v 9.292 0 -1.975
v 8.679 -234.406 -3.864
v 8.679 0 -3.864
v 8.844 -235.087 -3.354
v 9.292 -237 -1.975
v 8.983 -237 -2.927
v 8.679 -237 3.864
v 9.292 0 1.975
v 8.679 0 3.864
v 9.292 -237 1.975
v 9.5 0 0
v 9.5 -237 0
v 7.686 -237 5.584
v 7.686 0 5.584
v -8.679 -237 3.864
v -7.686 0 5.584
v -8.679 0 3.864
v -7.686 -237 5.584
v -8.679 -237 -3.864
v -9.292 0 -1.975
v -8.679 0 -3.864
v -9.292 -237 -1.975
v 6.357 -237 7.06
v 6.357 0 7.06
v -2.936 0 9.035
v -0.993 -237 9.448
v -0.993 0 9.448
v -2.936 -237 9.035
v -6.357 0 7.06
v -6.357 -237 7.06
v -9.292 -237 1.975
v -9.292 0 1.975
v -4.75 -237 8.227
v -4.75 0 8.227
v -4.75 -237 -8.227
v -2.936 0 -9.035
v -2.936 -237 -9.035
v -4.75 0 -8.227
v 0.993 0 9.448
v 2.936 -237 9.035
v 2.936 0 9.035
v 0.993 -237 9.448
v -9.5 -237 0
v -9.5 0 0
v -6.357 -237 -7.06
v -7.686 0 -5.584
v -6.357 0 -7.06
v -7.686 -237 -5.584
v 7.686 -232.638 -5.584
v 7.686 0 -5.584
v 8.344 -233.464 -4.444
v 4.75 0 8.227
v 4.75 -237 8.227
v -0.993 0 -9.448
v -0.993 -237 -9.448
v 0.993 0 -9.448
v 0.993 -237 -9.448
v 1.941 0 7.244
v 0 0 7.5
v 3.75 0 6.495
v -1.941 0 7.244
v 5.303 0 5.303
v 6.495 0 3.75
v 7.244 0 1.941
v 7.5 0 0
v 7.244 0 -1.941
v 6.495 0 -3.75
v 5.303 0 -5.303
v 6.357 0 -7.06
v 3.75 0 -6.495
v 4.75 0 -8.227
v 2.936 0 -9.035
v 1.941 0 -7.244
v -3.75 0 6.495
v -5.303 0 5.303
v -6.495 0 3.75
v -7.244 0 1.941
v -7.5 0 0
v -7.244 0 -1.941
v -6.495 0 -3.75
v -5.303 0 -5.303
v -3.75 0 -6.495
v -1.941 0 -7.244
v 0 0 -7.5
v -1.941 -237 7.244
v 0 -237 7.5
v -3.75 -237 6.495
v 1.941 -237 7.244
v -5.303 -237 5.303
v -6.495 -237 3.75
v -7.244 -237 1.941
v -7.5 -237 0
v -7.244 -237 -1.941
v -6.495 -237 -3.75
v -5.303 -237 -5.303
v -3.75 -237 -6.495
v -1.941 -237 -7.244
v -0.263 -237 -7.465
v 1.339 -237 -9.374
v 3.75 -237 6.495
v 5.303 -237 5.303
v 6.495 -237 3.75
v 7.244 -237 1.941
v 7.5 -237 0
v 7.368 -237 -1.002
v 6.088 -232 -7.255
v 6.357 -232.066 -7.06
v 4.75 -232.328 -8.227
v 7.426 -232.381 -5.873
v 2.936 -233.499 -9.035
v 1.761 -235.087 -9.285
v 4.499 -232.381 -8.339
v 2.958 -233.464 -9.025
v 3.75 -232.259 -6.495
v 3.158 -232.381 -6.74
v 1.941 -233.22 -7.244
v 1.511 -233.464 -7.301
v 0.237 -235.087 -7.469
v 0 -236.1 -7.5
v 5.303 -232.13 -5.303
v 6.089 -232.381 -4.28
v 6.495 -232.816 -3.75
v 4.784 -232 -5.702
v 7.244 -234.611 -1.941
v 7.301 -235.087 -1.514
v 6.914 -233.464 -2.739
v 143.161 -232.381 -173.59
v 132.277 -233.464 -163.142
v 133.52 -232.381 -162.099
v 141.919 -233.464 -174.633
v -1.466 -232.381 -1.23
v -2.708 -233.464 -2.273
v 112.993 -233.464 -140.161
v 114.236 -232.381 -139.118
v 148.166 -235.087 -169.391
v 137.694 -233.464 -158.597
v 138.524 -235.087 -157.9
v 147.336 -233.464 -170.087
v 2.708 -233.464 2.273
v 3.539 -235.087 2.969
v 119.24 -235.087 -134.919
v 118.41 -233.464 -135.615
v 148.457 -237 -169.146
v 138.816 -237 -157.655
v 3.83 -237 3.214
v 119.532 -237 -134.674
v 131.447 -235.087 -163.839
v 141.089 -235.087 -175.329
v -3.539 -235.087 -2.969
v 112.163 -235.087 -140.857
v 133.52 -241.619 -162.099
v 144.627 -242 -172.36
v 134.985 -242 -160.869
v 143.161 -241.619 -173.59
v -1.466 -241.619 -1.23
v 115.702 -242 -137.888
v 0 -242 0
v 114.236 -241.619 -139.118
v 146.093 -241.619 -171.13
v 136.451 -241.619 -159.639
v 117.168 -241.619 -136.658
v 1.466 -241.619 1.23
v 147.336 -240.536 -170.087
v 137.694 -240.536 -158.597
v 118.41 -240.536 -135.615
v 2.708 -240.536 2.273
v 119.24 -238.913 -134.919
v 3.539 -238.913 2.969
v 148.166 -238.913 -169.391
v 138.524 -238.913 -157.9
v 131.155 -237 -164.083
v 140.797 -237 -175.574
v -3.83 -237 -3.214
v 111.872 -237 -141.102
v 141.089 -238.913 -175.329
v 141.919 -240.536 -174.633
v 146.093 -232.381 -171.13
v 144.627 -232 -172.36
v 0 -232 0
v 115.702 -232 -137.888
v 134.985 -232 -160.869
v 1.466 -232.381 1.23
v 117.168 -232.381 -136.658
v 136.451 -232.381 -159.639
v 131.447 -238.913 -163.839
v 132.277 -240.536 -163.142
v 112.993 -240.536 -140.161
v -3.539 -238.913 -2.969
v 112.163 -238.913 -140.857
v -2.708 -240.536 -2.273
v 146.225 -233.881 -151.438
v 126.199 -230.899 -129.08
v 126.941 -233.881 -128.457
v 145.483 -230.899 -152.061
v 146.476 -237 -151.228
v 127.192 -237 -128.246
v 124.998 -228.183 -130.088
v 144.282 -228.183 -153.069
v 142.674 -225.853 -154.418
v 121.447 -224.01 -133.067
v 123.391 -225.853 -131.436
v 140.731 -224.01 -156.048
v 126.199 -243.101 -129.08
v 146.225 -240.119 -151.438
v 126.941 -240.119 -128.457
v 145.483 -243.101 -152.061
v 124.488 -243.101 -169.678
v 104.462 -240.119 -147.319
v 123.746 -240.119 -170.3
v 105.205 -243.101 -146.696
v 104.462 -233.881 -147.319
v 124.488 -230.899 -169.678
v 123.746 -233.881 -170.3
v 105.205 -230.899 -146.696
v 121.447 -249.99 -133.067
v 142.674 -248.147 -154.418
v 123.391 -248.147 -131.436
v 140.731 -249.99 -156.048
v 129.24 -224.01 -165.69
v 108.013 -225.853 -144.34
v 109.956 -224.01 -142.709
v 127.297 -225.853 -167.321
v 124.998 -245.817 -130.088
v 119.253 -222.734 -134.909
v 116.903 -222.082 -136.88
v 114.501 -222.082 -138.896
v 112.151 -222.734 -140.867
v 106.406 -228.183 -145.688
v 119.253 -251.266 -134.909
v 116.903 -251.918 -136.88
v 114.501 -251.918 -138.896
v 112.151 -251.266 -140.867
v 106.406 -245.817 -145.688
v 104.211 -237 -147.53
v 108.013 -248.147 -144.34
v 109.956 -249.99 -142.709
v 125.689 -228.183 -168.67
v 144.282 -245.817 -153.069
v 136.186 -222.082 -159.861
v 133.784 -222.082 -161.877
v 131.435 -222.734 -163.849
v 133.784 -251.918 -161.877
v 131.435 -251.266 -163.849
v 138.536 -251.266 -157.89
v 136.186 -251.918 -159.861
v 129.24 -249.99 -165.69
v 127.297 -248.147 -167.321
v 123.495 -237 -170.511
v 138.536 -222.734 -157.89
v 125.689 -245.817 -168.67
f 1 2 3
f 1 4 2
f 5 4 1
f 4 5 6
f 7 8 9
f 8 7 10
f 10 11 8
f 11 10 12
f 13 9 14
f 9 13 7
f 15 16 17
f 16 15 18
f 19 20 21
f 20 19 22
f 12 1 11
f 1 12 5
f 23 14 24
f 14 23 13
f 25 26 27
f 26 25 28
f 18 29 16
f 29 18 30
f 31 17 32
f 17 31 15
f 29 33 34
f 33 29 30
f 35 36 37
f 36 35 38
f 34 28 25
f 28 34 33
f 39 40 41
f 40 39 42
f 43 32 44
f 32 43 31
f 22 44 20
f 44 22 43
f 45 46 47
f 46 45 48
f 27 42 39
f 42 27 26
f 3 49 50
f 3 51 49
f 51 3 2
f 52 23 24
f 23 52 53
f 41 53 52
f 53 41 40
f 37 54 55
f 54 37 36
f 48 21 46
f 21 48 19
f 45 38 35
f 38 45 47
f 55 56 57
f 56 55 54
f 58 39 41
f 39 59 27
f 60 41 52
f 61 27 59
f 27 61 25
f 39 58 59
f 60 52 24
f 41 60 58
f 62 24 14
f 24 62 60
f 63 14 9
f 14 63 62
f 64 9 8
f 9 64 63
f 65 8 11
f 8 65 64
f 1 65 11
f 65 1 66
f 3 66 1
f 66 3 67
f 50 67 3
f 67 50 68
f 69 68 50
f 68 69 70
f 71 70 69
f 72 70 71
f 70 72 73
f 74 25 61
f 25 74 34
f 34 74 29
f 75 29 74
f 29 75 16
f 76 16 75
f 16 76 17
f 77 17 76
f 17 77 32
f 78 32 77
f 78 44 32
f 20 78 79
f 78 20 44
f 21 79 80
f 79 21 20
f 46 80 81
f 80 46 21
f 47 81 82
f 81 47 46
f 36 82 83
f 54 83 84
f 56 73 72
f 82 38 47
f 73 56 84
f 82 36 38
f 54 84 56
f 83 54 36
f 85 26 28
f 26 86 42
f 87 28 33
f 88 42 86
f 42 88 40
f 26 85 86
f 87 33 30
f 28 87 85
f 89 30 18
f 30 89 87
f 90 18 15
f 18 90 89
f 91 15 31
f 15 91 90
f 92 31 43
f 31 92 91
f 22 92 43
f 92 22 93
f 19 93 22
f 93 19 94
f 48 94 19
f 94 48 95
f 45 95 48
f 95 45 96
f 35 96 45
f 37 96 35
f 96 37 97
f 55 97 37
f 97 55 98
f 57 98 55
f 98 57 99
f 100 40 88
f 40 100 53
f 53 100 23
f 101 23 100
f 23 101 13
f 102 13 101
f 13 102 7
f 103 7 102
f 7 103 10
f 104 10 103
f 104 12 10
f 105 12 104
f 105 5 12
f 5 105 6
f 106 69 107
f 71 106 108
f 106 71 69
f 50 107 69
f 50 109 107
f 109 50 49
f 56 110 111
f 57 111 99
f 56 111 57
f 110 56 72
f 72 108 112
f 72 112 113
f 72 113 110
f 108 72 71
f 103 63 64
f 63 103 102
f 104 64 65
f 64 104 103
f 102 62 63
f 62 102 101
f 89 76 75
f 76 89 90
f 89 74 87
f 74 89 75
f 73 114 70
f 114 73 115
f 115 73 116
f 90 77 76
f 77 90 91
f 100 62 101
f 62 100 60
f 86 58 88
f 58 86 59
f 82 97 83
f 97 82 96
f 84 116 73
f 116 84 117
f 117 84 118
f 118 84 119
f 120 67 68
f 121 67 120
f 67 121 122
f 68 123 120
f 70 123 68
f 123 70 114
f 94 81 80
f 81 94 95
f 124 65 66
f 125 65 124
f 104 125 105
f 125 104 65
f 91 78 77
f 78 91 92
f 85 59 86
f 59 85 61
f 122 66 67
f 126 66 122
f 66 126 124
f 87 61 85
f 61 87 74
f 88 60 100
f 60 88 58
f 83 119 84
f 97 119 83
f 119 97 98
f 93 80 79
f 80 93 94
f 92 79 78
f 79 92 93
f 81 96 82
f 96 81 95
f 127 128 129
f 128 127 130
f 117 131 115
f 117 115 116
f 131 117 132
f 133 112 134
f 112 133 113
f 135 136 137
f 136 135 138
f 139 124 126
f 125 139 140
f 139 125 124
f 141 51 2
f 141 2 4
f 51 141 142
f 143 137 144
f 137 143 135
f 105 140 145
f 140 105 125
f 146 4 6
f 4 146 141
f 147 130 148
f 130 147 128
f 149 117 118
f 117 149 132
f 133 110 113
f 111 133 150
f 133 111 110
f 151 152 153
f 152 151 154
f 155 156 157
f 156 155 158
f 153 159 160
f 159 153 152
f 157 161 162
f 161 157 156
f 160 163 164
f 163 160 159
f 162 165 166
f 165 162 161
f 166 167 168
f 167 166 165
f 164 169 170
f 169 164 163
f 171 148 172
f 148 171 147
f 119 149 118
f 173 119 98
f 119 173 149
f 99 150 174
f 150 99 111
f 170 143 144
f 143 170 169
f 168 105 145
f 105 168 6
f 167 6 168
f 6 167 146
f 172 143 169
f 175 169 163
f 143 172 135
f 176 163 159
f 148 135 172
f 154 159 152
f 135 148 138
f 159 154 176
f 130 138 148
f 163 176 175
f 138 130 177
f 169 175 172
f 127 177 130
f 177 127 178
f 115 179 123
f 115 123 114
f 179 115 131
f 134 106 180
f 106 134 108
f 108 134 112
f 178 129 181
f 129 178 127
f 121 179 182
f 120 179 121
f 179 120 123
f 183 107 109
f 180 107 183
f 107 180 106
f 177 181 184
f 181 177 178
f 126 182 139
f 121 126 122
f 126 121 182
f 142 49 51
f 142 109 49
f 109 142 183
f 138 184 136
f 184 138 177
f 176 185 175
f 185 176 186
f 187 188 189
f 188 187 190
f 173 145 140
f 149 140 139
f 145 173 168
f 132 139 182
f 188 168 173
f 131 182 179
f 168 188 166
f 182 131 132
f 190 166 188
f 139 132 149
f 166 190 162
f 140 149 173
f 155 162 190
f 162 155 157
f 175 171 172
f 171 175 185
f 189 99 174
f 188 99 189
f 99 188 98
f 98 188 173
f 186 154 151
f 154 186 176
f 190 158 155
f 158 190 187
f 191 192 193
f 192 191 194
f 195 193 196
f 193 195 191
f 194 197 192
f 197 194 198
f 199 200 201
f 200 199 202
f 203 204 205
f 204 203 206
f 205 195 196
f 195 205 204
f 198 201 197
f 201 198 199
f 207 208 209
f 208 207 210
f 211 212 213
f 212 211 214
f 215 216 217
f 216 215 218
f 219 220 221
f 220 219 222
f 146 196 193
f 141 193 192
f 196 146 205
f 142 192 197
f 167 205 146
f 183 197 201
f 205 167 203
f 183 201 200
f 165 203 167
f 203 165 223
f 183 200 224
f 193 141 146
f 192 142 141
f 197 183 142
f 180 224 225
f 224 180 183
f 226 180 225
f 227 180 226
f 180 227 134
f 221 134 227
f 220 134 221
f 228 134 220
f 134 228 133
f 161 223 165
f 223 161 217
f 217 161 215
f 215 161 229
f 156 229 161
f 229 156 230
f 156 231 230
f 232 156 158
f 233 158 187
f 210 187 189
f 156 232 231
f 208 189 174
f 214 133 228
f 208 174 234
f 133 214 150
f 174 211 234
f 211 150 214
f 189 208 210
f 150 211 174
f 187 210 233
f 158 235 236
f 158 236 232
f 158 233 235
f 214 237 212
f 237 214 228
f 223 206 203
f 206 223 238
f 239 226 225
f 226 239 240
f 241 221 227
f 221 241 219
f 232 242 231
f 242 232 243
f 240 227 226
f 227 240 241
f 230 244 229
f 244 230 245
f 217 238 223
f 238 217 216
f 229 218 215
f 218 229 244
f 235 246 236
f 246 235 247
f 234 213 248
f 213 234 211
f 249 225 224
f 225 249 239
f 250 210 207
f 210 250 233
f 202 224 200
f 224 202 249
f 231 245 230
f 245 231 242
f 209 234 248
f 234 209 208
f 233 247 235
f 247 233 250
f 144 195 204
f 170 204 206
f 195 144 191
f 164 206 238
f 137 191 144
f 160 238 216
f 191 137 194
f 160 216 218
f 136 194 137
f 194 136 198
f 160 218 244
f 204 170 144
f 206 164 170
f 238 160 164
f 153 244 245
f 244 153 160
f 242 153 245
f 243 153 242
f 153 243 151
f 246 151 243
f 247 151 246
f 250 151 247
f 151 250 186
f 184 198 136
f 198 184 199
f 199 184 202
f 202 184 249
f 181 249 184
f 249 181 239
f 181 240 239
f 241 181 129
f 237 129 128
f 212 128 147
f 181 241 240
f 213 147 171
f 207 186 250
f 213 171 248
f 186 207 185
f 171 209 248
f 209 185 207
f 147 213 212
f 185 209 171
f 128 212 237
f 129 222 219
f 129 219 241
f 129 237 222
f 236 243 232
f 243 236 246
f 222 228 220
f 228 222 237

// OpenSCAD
// ==================== PARÁMETROS ====================
L_pendulo = 225;          
L_peso = 30;              
r_peso = 15;
r_varilla = 5;

armlength = 237;
pared = 2;
diam_tubo_arm = 19;
radio_ext = diam_tubo_arm / 2;
radio_int = radio_ext - pared;

// ==================== MÓDULOS ====================


// Brazo: se extiende a lo largo del eje Y positivo
module arm(){
    rotate([90, 0, 0]) {
        difference(){
            cylinder(h=armlength, r=radio_ext, center=false);
            cylinder(h=armlength + 2, r=radio_int, center=false);
        }
    }
}



// Péndulo: su PIVOTE está en el origen (parte superior de la varilla)
module pendulo(angulo){
    rotate([0, -angulo, 0]) { // Gira alrededor del eje Y (eje del brazo)
        // Varilla (baja desde 0 hasta -225)
        translate([0, 0, -L_pendulo])
            cylinder(h=L_pendulo, r=r_varilla, center=false);
        // Peso (situado a 15mm del extremo)
        translate([0, 0, -210])
            cylinder(h=L_peso, r=r_peso, center=false);
    }
}



// Sistema completo del péndulo de Furuta
module furuta(theta, alpha){
    rotate([0, 0, theta]) {        // 1. Rotación del brazo en el plano horizontal
        color("orangered")
        arm();                      // Dibuja el brazo desde el origen
        
        color("gray")
        translate([0,-armlength, 0]) { // 2. Traslada al extremo del brazo
            pendulo(alpha);          // 3. Dibuja el péndulo con su inclinación
        }
    }
}

// ==================== EJEMPLO ====================
// theta = ángulo del brazo (en grados), alpha = inclinación del péndulo (en grados)
//furuta(30, 30*sin(360*$t*2)); 
//furuta(10,40);

alpha = 40 * cos(360 * $t * 2);   // A·cos(ωt), ω = 2 vueltas
furuta(0, alpha);
